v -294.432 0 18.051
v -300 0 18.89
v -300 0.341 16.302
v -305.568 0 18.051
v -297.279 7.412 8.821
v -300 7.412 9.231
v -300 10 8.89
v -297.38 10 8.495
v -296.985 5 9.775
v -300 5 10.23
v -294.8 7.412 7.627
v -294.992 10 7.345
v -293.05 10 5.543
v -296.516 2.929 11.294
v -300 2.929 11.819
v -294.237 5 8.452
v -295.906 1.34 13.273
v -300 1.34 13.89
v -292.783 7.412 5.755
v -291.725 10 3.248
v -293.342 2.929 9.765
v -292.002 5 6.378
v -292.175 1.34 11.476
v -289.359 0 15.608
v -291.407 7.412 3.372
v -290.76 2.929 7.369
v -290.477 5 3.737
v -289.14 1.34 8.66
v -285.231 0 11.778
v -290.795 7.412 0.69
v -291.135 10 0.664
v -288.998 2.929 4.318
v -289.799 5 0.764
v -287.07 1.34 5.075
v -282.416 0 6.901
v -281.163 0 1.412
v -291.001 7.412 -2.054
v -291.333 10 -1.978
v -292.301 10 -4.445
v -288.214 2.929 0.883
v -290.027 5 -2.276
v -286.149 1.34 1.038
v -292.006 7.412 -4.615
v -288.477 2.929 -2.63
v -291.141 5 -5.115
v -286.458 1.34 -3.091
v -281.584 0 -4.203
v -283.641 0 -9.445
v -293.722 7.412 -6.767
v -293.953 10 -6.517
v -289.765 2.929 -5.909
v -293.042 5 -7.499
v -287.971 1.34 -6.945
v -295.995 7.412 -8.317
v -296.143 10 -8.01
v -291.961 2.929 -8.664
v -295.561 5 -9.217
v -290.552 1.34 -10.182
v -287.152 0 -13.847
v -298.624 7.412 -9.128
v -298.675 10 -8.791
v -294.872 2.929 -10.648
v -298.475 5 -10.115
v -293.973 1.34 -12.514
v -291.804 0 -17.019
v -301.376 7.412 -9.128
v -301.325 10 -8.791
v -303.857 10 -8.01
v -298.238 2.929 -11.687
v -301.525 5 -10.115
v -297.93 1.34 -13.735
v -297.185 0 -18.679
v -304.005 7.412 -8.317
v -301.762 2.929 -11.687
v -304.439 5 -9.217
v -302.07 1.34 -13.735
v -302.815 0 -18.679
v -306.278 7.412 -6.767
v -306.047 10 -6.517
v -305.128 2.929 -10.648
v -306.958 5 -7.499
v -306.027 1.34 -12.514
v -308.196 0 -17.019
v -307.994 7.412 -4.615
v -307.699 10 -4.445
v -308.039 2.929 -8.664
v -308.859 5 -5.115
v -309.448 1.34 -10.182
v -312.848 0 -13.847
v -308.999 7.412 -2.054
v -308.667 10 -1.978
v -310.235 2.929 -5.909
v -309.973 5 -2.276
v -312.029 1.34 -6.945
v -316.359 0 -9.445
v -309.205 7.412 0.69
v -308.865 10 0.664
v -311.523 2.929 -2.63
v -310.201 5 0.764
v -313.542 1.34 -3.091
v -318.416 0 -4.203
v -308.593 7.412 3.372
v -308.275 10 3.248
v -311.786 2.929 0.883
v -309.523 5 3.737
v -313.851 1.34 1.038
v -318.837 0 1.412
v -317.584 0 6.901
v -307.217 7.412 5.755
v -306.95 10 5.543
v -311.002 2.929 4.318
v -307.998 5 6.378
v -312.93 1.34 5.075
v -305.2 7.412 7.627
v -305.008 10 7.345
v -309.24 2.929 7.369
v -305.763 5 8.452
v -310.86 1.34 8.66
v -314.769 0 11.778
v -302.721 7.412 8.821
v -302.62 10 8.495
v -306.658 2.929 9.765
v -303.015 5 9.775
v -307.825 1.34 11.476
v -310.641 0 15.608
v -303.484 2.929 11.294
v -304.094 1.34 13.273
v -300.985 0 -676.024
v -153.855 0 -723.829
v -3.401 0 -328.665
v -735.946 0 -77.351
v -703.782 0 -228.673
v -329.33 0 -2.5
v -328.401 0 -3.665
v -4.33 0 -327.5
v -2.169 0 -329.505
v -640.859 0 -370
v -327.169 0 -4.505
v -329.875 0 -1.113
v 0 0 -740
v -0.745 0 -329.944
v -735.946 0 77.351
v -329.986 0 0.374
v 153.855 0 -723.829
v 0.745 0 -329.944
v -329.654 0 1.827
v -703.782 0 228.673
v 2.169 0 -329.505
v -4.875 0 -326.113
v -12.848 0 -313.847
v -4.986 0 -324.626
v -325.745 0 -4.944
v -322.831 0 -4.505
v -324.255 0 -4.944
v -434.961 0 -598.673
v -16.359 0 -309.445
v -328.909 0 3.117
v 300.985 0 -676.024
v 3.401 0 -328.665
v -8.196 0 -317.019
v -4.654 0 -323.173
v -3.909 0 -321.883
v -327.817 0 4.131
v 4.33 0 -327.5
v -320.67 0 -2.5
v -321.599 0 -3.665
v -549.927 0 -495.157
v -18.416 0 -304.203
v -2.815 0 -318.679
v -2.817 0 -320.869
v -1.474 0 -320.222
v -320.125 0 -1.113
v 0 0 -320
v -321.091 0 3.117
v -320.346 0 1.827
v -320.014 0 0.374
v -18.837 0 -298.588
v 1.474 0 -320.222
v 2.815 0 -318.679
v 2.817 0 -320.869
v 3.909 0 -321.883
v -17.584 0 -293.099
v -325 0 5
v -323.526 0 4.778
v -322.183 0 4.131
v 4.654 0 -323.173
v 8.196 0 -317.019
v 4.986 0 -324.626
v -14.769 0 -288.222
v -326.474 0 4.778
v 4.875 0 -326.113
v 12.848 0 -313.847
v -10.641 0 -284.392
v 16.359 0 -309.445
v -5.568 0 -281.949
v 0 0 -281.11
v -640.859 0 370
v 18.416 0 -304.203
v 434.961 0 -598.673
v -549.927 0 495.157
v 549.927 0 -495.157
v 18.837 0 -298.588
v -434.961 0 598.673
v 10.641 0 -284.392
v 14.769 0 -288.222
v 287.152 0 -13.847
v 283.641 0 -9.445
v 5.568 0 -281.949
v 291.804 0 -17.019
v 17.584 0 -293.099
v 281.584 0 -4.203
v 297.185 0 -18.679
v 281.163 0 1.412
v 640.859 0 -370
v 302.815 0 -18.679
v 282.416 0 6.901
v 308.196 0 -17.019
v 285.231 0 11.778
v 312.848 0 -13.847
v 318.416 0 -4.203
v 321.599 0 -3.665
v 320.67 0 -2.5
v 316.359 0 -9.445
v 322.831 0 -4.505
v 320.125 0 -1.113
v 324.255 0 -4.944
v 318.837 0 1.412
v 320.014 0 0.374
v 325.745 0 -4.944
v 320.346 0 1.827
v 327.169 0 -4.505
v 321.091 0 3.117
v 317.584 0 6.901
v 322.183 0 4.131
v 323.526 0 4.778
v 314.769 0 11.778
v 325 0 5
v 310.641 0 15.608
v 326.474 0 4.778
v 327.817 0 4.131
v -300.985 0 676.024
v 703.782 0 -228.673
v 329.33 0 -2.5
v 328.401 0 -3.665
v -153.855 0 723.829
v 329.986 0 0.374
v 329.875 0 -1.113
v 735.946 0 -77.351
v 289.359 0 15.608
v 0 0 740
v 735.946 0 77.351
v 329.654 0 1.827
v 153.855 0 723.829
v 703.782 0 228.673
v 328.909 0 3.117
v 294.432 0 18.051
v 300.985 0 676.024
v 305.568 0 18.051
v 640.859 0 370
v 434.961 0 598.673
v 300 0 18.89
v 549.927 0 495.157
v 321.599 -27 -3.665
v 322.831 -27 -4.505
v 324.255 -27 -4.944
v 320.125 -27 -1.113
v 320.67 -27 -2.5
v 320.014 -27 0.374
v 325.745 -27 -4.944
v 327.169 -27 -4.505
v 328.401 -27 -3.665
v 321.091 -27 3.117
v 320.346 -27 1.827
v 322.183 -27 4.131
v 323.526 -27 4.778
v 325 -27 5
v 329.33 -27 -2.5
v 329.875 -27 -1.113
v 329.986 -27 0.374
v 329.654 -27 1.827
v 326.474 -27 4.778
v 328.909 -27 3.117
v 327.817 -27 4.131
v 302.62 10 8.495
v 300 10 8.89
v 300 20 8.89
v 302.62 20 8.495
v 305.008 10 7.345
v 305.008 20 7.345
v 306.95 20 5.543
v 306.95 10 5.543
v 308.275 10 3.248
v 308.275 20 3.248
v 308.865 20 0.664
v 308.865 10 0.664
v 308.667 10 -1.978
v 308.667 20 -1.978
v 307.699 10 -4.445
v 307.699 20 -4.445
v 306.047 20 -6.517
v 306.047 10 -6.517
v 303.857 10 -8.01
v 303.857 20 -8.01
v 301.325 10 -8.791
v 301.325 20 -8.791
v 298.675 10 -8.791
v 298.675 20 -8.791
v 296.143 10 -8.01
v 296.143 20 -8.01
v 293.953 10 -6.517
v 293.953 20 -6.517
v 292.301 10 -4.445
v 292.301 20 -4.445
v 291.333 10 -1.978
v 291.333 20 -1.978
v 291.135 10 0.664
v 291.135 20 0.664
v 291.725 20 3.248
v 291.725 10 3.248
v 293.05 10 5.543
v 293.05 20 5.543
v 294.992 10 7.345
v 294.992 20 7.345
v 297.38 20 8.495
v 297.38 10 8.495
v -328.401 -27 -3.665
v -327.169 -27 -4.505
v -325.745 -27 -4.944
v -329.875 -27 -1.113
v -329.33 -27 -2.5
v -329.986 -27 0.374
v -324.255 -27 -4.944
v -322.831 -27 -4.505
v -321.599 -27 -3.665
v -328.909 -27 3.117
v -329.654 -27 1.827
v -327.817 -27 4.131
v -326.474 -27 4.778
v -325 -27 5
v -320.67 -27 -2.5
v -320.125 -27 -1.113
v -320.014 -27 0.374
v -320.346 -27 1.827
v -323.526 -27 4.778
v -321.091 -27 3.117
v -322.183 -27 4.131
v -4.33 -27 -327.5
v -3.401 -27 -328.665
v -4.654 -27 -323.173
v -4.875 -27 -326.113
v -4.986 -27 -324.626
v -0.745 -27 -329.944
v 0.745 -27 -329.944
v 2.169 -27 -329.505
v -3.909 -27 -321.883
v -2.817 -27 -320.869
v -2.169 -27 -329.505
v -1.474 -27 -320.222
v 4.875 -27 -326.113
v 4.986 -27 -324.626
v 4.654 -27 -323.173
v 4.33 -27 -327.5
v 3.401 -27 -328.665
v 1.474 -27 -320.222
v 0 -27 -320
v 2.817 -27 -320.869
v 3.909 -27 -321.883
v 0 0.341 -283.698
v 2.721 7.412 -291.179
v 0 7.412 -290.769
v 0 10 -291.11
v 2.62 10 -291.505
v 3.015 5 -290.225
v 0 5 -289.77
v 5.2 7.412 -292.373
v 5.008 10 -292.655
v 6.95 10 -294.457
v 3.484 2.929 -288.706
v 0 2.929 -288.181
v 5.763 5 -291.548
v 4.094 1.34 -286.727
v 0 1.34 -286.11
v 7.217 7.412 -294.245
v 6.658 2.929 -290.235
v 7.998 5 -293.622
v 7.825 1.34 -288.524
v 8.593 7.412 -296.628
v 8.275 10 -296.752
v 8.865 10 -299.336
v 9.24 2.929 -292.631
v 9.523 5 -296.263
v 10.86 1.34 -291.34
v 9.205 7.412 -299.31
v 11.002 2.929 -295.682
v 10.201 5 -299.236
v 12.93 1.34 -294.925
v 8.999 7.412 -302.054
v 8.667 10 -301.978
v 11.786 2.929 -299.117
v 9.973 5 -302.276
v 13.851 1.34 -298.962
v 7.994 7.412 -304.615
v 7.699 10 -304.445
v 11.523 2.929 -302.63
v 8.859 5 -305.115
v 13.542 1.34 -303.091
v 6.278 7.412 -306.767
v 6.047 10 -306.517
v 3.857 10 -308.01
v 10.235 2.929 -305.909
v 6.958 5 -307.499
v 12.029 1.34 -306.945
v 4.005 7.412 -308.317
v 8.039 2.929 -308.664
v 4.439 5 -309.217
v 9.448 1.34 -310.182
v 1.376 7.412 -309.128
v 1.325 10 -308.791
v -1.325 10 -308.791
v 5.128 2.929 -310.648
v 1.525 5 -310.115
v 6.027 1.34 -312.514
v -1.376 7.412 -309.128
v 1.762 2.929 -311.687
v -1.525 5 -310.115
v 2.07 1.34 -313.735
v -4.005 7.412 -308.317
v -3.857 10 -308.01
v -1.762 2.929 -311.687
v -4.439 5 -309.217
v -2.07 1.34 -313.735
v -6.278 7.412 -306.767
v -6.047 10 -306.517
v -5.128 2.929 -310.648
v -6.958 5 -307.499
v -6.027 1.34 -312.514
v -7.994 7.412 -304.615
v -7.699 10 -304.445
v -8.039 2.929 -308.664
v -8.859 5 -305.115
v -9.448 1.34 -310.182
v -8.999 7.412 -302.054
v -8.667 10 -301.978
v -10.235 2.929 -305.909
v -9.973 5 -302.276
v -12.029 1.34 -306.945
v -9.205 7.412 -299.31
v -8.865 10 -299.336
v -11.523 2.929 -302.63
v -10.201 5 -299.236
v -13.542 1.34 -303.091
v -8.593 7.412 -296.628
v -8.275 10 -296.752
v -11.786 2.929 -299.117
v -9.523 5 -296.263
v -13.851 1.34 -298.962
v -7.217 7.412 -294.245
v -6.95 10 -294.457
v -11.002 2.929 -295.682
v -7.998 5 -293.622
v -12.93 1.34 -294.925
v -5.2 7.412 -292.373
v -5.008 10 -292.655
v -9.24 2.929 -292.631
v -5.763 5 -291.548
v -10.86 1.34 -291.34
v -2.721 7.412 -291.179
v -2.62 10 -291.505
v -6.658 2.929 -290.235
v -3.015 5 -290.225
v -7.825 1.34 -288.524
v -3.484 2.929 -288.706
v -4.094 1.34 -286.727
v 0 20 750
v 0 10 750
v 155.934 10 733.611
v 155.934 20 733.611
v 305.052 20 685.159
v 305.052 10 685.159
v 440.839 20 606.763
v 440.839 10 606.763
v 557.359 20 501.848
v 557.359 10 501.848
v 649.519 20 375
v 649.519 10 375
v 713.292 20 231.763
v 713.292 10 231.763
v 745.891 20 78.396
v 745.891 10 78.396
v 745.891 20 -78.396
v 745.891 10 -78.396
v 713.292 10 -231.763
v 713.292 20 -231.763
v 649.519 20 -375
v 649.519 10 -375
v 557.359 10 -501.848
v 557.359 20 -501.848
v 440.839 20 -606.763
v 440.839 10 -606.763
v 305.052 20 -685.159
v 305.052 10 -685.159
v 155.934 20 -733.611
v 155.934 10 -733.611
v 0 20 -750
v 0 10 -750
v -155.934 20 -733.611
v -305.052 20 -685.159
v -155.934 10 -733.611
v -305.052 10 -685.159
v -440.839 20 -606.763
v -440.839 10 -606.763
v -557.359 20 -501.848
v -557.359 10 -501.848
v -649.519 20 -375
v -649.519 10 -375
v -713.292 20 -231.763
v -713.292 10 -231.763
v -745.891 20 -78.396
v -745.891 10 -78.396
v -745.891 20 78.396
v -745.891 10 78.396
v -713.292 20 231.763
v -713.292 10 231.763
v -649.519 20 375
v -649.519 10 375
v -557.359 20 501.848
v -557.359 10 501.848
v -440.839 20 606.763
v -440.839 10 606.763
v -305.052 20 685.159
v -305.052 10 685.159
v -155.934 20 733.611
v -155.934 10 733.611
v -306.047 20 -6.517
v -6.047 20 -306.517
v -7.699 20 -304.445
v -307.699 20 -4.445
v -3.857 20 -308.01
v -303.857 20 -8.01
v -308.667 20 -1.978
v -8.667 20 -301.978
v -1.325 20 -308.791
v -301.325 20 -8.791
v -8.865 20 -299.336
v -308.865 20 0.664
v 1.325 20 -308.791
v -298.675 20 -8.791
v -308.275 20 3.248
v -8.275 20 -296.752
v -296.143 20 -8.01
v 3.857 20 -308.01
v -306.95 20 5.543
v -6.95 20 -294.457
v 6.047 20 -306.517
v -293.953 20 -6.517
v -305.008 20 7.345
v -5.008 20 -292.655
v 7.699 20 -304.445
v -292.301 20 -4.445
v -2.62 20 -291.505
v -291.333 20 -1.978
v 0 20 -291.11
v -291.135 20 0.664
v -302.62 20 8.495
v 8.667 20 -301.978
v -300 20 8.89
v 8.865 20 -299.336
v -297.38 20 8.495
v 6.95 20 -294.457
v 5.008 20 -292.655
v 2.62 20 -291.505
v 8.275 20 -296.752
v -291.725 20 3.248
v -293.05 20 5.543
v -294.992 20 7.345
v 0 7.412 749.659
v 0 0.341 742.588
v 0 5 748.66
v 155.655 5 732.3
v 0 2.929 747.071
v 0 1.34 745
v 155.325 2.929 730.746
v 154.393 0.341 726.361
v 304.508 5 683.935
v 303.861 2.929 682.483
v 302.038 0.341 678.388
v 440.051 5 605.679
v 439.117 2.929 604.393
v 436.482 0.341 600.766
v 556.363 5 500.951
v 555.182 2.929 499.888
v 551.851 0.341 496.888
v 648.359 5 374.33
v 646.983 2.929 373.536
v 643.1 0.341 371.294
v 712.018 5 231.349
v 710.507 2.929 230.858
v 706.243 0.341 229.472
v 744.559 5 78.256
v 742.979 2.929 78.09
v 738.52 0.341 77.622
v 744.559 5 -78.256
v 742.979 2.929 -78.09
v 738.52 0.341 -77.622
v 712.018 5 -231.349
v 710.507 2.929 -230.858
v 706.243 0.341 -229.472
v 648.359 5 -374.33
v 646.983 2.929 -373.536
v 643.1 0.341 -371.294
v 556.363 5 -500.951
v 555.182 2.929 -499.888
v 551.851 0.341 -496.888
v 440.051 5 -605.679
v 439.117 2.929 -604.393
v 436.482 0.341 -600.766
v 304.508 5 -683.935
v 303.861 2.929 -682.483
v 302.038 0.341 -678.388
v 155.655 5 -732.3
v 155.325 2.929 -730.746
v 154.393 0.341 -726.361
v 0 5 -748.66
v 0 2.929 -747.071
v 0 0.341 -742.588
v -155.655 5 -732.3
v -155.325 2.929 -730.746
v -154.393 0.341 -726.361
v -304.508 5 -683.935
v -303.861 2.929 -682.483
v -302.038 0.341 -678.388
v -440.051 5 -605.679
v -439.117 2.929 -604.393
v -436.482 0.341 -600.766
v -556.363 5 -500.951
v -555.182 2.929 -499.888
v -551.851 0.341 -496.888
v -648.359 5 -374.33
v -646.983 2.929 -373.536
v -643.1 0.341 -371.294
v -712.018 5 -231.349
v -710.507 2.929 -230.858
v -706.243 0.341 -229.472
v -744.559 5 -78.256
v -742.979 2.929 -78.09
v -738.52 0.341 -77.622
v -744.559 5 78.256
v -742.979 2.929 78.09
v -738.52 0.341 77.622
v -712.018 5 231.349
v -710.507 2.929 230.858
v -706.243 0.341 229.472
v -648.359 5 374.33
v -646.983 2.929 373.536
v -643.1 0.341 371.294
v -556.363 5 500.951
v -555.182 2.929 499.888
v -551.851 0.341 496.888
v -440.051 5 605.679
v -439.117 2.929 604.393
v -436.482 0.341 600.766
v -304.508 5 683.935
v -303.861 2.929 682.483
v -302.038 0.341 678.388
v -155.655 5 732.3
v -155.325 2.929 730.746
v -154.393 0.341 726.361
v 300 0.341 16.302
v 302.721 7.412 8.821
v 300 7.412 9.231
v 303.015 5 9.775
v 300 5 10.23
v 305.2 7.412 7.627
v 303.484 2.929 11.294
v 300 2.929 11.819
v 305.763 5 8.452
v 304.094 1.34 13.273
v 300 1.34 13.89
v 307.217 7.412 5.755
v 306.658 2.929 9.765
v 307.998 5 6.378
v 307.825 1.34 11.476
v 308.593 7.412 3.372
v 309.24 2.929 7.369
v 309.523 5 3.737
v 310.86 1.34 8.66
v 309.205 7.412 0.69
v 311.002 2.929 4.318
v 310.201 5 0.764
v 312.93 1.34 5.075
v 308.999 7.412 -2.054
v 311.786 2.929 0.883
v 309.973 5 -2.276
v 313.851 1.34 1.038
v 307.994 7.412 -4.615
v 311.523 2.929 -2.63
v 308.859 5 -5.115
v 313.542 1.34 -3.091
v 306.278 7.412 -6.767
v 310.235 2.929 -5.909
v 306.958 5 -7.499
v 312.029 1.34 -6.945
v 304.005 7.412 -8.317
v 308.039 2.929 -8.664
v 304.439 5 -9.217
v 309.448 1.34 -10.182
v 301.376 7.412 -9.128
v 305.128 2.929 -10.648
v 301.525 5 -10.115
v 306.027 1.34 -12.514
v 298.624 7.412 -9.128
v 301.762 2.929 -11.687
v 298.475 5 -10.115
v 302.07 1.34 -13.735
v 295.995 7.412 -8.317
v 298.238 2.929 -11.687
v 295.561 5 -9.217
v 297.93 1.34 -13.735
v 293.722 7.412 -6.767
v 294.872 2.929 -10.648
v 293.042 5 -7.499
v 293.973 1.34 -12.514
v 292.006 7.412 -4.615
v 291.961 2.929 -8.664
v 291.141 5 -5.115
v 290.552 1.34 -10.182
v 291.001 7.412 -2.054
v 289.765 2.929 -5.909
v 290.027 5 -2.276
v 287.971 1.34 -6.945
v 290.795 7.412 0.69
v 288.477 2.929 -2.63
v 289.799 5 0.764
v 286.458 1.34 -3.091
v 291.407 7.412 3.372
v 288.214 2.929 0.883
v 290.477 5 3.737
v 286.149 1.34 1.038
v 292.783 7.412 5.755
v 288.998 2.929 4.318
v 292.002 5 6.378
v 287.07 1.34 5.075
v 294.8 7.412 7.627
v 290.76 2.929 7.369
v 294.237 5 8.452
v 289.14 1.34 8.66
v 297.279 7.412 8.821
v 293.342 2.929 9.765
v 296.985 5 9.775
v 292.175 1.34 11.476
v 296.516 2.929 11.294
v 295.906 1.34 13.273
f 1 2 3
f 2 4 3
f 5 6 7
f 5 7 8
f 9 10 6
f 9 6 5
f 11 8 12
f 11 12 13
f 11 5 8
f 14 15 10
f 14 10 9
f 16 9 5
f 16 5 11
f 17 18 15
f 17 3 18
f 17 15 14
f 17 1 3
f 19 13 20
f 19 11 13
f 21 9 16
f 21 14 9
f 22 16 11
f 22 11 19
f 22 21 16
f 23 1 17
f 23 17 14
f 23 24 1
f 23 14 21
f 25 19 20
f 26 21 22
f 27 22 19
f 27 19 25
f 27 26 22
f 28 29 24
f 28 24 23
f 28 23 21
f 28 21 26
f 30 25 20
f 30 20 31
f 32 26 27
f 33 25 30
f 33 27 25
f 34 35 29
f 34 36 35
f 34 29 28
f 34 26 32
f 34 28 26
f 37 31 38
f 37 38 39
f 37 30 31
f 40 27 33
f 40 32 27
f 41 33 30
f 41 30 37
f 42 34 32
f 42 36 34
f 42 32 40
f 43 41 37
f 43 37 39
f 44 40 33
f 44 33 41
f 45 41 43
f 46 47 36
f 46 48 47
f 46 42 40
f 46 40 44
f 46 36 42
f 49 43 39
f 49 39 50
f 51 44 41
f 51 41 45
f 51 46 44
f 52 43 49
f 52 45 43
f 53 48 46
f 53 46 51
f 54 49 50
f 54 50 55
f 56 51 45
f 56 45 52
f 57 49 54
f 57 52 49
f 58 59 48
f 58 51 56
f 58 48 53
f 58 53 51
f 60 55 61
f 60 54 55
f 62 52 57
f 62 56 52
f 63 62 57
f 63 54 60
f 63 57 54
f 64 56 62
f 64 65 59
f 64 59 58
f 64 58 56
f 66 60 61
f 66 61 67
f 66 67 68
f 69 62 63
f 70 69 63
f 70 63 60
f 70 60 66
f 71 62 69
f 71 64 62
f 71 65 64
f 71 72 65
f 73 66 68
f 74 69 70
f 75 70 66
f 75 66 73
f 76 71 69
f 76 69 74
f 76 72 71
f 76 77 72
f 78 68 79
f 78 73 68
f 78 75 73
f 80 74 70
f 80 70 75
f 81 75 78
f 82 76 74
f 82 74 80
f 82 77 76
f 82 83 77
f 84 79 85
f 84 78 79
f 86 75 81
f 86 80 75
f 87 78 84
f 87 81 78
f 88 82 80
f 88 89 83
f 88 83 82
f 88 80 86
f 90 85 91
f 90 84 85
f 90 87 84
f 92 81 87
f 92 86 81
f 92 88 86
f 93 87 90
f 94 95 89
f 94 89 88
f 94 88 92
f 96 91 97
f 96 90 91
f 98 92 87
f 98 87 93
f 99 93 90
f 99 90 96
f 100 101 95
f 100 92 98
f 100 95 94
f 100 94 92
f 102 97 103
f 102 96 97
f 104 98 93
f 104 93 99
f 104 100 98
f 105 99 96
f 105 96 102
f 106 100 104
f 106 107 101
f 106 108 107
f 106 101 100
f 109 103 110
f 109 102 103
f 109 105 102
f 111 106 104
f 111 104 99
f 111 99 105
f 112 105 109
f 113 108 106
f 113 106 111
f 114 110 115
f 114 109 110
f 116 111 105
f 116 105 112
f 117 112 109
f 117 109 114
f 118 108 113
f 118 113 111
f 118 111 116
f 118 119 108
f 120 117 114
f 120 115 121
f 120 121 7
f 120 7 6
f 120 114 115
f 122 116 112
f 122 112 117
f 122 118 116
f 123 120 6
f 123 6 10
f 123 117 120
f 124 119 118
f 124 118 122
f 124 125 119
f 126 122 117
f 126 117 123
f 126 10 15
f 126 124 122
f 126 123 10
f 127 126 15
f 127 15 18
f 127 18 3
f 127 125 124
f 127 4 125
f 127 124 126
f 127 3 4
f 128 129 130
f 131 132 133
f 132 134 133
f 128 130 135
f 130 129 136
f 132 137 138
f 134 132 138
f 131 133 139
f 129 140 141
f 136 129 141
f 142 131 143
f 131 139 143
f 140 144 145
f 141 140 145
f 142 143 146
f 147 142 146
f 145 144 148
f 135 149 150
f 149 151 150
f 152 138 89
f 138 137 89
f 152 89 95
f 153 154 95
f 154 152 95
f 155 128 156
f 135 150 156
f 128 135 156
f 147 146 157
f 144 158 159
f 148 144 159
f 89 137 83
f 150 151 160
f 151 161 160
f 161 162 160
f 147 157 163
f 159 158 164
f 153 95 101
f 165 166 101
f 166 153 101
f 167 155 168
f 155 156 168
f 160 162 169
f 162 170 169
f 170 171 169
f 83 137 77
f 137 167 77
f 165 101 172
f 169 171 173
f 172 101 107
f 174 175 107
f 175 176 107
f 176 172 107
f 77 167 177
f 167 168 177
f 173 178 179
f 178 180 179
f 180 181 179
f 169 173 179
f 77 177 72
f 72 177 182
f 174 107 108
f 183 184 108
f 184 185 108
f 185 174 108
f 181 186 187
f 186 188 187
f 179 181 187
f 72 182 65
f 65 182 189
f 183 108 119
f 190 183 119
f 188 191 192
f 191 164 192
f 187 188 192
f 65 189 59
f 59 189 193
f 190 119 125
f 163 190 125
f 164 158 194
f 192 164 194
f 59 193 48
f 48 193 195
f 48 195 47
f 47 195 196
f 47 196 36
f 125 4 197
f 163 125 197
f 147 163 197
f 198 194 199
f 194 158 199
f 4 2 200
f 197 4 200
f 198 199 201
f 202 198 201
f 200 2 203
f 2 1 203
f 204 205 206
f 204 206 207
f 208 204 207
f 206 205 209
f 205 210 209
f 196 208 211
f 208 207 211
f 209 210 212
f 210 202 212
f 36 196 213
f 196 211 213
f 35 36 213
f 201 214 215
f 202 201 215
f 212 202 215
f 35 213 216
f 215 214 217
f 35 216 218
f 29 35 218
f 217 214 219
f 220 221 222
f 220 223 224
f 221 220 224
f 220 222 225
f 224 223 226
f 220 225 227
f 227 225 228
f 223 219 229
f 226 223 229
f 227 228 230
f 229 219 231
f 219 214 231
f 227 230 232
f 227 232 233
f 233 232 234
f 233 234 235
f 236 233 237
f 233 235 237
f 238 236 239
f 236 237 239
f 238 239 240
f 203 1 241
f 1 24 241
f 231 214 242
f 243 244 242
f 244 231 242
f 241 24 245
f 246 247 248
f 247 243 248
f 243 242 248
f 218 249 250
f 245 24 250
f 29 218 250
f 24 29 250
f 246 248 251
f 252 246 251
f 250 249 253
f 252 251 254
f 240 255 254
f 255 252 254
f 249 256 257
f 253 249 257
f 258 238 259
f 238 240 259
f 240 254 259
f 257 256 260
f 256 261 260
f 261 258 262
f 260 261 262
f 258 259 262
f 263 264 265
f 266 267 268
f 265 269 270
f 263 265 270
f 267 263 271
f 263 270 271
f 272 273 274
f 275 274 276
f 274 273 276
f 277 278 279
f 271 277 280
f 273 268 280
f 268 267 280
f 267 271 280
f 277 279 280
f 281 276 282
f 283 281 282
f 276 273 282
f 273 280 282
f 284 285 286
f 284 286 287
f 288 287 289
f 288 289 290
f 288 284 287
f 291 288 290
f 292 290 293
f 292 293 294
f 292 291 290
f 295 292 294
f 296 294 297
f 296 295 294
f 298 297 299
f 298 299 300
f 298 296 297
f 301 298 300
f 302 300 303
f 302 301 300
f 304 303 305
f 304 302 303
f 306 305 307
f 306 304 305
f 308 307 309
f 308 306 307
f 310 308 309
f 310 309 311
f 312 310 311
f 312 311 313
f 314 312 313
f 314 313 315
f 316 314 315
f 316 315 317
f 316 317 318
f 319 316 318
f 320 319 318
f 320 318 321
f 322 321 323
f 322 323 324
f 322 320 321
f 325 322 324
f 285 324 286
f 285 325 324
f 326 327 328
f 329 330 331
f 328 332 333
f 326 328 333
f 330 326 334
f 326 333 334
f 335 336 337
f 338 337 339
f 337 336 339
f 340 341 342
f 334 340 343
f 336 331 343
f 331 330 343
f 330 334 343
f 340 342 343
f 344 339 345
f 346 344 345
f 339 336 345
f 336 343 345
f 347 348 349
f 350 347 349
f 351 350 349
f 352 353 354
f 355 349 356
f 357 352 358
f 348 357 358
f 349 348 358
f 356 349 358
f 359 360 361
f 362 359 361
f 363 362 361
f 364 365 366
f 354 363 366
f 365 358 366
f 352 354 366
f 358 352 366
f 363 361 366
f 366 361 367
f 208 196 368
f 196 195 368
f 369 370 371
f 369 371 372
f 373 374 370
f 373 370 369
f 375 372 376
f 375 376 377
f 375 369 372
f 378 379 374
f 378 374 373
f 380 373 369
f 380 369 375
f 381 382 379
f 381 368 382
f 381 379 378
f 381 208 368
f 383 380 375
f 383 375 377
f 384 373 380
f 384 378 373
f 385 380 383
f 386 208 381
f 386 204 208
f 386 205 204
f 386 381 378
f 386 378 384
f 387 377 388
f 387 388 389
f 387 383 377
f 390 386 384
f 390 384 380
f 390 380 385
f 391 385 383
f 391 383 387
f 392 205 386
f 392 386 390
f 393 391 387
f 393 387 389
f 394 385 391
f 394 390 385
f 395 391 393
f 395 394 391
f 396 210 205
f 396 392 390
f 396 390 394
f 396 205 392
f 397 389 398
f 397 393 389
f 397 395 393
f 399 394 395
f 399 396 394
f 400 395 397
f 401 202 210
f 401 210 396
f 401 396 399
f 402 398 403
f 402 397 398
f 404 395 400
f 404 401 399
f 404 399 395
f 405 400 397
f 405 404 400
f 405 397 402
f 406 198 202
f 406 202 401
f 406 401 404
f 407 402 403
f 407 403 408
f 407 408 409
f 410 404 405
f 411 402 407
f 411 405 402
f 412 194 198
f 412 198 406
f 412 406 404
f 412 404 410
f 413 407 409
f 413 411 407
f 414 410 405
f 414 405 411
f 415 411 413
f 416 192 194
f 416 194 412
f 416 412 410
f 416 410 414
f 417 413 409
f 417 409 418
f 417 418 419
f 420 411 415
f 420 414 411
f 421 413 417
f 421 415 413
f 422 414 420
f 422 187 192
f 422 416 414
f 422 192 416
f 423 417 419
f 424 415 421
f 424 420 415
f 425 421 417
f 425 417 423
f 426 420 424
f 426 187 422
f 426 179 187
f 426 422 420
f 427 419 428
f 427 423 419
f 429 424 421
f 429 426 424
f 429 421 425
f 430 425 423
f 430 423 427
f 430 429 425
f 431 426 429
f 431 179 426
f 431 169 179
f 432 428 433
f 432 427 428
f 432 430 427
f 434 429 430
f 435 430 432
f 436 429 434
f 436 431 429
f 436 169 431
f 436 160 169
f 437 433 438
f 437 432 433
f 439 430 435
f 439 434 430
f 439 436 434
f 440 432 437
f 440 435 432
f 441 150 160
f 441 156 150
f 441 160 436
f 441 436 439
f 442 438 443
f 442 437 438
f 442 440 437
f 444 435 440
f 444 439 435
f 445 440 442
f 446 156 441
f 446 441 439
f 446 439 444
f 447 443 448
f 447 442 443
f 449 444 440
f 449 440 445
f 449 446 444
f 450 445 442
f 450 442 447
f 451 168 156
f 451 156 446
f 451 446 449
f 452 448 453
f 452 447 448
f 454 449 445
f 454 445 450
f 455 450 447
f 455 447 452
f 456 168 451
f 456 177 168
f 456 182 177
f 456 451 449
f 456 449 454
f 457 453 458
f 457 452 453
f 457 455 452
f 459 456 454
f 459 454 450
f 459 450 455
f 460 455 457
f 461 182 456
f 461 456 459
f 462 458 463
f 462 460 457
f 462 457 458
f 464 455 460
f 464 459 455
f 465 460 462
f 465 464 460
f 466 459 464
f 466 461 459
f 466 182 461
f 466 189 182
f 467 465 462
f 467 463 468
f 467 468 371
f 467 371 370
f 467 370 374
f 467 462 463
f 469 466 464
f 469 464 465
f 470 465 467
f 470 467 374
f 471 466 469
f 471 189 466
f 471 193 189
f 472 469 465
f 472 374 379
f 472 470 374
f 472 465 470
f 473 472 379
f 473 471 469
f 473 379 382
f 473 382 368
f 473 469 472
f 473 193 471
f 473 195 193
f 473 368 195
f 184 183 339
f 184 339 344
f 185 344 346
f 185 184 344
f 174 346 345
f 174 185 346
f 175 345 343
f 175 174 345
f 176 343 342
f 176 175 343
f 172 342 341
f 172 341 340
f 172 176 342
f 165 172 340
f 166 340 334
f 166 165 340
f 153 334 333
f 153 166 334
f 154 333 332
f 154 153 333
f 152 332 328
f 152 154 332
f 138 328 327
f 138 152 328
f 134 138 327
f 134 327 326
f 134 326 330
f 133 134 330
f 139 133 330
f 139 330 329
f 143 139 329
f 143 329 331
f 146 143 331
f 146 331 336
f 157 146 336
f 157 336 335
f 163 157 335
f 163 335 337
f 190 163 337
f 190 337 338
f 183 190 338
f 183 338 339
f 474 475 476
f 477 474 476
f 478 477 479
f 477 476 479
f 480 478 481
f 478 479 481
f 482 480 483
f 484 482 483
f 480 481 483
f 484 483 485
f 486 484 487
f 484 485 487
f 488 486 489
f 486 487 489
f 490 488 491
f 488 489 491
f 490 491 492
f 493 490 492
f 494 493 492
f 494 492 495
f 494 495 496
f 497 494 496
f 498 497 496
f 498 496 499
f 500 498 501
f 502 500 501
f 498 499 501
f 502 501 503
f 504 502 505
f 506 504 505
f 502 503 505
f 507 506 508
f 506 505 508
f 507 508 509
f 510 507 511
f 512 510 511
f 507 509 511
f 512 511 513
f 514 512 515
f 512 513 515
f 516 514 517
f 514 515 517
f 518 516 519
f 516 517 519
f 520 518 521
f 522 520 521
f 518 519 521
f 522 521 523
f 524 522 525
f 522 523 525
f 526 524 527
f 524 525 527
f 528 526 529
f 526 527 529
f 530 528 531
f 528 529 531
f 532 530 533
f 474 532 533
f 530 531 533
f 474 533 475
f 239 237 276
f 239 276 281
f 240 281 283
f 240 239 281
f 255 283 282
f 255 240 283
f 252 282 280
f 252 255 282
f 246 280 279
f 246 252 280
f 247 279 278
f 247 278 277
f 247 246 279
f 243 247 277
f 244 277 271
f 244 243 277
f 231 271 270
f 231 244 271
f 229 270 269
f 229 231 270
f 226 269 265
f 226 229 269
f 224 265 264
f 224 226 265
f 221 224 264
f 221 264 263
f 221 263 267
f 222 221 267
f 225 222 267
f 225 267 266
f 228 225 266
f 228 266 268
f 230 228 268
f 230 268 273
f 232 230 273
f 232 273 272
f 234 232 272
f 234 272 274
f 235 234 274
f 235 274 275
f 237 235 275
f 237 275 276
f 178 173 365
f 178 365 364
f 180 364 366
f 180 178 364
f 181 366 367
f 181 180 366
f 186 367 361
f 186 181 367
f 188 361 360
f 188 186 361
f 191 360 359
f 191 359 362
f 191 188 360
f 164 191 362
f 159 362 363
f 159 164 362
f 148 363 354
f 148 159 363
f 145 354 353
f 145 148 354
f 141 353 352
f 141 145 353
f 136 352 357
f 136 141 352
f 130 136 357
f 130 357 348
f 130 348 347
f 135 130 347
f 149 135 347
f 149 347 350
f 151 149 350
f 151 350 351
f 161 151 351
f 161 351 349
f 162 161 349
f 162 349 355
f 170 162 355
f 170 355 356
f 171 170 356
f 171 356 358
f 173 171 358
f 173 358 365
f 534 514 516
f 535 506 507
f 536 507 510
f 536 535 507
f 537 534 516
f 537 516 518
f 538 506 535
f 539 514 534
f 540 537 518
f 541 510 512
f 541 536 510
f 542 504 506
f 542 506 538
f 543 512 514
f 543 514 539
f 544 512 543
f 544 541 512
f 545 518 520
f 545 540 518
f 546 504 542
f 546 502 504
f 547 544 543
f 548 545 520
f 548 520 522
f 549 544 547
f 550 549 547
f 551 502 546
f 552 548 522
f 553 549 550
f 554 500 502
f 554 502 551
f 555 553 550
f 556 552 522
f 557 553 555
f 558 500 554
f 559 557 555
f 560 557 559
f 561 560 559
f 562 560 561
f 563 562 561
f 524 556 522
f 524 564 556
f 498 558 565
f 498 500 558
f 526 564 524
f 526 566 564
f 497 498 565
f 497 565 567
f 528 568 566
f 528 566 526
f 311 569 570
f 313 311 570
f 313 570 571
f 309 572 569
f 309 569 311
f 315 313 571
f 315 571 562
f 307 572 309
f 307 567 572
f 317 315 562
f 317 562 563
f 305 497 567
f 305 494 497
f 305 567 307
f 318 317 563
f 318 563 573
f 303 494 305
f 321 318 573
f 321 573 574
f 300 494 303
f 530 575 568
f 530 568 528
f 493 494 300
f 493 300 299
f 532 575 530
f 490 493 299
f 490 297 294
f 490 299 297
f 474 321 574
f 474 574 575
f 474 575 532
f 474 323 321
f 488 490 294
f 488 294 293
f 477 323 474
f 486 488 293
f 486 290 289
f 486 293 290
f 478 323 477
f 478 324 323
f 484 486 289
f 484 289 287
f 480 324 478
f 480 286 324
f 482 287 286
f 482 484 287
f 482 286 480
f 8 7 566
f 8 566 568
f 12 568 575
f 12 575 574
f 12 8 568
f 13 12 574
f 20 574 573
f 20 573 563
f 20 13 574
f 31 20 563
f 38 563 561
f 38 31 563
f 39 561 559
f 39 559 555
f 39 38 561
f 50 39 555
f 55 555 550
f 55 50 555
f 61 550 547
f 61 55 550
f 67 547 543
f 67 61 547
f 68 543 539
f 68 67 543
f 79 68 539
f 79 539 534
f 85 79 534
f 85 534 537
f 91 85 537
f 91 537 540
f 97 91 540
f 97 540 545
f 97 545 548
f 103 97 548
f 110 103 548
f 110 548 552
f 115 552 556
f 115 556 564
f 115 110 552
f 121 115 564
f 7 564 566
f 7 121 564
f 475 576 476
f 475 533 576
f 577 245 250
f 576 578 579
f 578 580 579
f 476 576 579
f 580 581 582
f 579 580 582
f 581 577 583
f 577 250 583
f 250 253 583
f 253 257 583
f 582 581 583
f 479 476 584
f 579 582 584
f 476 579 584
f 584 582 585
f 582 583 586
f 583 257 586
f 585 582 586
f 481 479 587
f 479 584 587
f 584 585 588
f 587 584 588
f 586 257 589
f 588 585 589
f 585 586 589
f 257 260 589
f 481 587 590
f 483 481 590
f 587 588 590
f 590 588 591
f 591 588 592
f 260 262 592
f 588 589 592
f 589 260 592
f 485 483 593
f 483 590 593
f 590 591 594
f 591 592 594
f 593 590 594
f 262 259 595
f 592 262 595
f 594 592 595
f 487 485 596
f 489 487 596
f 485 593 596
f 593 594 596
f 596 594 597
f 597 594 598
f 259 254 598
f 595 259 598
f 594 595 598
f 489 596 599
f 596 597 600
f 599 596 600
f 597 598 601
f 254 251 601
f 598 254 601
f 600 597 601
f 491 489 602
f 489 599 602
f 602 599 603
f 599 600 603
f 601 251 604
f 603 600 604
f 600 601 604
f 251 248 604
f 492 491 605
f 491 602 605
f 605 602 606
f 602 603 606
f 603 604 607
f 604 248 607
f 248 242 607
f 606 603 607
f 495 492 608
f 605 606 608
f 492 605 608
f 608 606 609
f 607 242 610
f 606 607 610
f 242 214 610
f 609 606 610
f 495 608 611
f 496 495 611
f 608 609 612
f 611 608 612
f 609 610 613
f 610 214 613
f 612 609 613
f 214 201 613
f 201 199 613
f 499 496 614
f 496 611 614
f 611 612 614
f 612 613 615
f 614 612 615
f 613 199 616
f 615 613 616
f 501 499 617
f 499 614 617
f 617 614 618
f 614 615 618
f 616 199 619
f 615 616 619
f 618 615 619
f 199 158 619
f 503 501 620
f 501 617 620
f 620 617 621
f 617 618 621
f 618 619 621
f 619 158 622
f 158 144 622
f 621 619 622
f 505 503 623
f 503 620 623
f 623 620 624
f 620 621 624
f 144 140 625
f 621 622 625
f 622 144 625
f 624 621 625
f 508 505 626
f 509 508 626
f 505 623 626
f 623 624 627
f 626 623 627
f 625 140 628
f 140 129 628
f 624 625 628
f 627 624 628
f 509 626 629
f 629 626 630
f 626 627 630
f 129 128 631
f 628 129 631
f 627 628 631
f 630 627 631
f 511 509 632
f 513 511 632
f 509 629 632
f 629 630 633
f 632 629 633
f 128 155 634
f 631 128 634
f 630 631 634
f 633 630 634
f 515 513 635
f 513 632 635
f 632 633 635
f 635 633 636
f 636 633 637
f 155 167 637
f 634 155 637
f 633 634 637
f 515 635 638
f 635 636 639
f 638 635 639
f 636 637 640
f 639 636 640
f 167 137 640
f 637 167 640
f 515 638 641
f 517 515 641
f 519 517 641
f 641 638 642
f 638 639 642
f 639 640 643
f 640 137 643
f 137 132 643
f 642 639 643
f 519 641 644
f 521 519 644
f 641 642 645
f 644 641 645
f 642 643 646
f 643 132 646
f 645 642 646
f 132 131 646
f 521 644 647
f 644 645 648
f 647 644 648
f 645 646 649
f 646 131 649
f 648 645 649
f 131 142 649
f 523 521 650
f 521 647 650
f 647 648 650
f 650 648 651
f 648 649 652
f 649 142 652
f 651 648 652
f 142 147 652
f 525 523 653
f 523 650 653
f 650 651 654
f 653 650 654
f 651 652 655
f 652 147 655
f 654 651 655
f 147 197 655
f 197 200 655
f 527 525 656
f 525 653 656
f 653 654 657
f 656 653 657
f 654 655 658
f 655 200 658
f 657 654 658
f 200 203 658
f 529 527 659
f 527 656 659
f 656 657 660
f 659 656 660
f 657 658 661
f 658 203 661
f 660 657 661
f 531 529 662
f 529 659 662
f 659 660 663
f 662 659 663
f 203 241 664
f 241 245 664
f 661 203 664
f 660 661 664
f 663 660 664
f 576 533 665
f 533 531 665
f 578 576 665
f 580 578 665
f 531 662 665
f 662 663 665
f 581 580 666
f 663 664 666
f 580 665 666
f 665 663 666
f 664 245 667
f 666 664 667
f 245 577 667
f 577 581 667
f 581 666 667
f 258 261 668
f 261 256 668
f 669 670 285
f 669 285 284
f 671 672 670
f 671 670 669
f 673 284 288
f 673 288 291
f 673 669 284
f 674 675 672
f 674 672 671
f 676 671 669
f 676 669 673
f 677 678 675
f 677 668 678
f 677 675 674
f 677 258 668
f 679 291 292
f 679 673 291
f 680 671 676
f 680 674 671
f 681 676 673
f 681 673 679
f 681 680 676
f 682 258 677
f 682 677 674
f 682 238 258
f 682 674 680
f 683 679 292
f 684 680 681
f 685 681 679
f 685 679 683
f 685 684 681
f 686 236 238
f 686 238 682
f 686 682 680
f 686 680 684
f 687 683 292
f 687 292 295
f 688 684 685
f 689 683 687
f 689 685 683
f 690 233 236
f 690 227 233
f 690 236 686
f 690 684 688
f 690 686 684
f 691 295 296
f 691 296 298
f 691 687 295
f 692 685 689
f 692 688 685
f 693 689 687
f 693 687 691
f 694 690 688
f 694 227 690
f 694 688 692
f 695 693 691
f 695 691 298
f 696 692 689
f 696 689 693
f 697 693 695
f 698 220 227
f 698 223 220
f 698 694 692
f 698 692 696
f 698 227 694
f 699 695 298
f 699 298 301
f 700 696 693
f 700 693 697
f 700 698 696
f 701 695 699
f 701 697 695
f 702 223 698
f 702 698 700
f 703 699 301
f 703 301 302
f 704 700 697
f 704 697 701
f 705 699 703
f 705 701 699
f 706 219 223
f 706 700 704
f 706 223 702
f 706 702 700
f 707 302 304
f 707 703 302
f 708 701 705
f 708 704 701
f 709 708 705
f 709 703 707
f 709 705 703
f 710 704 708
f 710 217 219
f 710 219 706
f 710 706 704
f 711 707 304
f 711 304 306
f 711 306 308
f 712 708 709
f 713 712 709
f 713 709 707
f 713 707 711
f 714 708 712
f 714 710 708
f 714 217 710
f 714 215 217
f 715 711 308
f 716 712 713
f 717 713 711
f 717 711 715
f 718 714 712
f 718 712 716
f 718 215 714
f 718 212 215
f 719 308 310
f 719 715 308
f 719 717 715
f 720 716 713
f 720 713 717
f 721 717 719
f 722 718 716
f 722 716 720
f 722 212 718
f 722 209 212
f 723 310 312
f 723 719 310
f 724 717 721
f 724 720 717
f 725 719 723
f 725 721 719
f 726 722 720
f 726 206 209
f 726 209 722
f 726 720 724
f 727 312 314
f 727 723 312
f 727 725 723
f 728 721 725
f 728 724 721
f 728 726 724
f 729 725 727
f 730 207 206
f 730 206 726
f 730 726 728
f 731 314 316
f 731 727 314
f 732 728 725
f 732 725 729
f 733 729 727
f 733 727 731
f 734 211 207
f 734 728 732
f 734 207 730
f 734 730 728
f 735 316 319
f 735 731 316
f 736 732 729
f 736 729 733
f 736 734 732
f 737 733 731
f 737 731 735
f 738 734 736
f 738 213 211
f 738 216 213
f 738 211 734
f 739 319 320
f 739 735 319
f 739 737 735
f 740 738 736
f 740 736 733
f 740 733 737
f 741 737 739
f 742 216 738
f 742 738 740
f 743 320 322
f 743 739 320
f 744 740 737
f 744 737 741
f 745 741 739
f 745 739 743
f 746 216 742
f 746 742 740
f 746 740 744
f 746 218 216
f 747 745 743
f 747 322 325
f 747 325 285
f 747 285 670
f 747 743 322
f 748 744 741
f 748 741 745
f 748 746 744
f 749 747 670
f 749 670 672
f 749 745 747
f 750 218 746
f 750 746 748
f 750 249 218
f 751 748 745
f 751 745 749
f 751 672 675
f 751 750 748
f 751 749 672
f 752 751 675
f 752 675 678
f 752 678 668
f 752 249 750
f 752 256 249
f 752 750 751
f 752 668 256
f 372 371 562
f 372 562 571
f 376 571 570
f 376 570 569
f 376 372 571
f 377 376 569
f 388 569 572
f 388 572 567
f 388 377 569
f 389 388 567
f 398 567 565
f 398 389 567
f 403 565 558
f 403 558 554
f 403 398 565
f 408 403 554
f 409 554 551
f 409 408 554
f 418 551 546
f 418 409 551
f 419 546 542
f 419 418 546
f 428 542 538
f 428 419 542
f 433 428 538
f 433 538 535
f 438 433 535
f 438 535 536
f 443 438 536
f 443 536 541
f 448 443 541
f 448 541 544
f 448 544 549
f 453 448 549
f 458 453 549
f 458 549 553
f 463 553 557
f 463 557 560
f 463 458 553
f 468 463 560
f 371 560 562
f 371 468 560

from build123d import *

# Parameters (mm, degrees)
SKETCH1_R           = 750
SKETCH1_R_2         = 8.89
BOSS_EXTRUDE1_DEPTH = 20
FILLET1_R           = 10
SKETCH3_R           = 5
BOSS_EXTRUDE2_DEPTH = 47


with BuildPart() as part:
    # Sketch1 → Boss-Extrude1 (new body)
    with BuildSketch(Plane(origin=(0, 0, 0), x_dir=(1, 0, 0), z_dir=(0, 1, 0))):
        with Locations(Location((0, 0, 0), (0, 0, 270))):
            Circle(SKETCH1_R)
        with Locations(Location((0, 300, 0), (0, 0, 270))):
            Circle(SKETCH1_R_2, mode=Mode.SUBTRACT)
        with Locations(Location((-300, 0, 0), (0, 0, 270))):
            Circle(SKETCH1_R_2, mode=Mode.SUBTRACT)
        with Locations(Location((300, 0, 0), (0, 0, 270))):
            Circle(SKETCH1_R_2, mode=Mode.SUBTRACT)
    extrude(amount=BOSS_EXTRUDE1_DEPTH)

    # Fillet1
    fillet1_edges = [part.edges().sort_by_distance(p)[0] for p in [
        (0, 0, -750),
        (-300, 0, -8.89),
        (300, 0, -8.89),
        (0, 0, -308.89),
    ]]
    fillet(fillet1_edges, radius=FILLET1_R)

    # Sketch3 → Boss-Extrude2 (add)
    with BuildSketch(Plane(origin=(0, 20, 0), x_dir=(1, 0, 0), z_dir=(0, 1, 0))):
        with Locations(Location((-325, 0, 0), (0, 0, 270))):
            Circle(SKETCH3_R)
        with Locations(Location((325, 0, 0), (0, 0, 270))):
            Circle(SKETCH3_R)
        with Locations(Location((0, 325, 0), (0, 0, 270))):
            Circle(SKETCH3_R)
    extrude(amount=-BOSS_EXTRUDE2_DEPTH)


solid = part.part
